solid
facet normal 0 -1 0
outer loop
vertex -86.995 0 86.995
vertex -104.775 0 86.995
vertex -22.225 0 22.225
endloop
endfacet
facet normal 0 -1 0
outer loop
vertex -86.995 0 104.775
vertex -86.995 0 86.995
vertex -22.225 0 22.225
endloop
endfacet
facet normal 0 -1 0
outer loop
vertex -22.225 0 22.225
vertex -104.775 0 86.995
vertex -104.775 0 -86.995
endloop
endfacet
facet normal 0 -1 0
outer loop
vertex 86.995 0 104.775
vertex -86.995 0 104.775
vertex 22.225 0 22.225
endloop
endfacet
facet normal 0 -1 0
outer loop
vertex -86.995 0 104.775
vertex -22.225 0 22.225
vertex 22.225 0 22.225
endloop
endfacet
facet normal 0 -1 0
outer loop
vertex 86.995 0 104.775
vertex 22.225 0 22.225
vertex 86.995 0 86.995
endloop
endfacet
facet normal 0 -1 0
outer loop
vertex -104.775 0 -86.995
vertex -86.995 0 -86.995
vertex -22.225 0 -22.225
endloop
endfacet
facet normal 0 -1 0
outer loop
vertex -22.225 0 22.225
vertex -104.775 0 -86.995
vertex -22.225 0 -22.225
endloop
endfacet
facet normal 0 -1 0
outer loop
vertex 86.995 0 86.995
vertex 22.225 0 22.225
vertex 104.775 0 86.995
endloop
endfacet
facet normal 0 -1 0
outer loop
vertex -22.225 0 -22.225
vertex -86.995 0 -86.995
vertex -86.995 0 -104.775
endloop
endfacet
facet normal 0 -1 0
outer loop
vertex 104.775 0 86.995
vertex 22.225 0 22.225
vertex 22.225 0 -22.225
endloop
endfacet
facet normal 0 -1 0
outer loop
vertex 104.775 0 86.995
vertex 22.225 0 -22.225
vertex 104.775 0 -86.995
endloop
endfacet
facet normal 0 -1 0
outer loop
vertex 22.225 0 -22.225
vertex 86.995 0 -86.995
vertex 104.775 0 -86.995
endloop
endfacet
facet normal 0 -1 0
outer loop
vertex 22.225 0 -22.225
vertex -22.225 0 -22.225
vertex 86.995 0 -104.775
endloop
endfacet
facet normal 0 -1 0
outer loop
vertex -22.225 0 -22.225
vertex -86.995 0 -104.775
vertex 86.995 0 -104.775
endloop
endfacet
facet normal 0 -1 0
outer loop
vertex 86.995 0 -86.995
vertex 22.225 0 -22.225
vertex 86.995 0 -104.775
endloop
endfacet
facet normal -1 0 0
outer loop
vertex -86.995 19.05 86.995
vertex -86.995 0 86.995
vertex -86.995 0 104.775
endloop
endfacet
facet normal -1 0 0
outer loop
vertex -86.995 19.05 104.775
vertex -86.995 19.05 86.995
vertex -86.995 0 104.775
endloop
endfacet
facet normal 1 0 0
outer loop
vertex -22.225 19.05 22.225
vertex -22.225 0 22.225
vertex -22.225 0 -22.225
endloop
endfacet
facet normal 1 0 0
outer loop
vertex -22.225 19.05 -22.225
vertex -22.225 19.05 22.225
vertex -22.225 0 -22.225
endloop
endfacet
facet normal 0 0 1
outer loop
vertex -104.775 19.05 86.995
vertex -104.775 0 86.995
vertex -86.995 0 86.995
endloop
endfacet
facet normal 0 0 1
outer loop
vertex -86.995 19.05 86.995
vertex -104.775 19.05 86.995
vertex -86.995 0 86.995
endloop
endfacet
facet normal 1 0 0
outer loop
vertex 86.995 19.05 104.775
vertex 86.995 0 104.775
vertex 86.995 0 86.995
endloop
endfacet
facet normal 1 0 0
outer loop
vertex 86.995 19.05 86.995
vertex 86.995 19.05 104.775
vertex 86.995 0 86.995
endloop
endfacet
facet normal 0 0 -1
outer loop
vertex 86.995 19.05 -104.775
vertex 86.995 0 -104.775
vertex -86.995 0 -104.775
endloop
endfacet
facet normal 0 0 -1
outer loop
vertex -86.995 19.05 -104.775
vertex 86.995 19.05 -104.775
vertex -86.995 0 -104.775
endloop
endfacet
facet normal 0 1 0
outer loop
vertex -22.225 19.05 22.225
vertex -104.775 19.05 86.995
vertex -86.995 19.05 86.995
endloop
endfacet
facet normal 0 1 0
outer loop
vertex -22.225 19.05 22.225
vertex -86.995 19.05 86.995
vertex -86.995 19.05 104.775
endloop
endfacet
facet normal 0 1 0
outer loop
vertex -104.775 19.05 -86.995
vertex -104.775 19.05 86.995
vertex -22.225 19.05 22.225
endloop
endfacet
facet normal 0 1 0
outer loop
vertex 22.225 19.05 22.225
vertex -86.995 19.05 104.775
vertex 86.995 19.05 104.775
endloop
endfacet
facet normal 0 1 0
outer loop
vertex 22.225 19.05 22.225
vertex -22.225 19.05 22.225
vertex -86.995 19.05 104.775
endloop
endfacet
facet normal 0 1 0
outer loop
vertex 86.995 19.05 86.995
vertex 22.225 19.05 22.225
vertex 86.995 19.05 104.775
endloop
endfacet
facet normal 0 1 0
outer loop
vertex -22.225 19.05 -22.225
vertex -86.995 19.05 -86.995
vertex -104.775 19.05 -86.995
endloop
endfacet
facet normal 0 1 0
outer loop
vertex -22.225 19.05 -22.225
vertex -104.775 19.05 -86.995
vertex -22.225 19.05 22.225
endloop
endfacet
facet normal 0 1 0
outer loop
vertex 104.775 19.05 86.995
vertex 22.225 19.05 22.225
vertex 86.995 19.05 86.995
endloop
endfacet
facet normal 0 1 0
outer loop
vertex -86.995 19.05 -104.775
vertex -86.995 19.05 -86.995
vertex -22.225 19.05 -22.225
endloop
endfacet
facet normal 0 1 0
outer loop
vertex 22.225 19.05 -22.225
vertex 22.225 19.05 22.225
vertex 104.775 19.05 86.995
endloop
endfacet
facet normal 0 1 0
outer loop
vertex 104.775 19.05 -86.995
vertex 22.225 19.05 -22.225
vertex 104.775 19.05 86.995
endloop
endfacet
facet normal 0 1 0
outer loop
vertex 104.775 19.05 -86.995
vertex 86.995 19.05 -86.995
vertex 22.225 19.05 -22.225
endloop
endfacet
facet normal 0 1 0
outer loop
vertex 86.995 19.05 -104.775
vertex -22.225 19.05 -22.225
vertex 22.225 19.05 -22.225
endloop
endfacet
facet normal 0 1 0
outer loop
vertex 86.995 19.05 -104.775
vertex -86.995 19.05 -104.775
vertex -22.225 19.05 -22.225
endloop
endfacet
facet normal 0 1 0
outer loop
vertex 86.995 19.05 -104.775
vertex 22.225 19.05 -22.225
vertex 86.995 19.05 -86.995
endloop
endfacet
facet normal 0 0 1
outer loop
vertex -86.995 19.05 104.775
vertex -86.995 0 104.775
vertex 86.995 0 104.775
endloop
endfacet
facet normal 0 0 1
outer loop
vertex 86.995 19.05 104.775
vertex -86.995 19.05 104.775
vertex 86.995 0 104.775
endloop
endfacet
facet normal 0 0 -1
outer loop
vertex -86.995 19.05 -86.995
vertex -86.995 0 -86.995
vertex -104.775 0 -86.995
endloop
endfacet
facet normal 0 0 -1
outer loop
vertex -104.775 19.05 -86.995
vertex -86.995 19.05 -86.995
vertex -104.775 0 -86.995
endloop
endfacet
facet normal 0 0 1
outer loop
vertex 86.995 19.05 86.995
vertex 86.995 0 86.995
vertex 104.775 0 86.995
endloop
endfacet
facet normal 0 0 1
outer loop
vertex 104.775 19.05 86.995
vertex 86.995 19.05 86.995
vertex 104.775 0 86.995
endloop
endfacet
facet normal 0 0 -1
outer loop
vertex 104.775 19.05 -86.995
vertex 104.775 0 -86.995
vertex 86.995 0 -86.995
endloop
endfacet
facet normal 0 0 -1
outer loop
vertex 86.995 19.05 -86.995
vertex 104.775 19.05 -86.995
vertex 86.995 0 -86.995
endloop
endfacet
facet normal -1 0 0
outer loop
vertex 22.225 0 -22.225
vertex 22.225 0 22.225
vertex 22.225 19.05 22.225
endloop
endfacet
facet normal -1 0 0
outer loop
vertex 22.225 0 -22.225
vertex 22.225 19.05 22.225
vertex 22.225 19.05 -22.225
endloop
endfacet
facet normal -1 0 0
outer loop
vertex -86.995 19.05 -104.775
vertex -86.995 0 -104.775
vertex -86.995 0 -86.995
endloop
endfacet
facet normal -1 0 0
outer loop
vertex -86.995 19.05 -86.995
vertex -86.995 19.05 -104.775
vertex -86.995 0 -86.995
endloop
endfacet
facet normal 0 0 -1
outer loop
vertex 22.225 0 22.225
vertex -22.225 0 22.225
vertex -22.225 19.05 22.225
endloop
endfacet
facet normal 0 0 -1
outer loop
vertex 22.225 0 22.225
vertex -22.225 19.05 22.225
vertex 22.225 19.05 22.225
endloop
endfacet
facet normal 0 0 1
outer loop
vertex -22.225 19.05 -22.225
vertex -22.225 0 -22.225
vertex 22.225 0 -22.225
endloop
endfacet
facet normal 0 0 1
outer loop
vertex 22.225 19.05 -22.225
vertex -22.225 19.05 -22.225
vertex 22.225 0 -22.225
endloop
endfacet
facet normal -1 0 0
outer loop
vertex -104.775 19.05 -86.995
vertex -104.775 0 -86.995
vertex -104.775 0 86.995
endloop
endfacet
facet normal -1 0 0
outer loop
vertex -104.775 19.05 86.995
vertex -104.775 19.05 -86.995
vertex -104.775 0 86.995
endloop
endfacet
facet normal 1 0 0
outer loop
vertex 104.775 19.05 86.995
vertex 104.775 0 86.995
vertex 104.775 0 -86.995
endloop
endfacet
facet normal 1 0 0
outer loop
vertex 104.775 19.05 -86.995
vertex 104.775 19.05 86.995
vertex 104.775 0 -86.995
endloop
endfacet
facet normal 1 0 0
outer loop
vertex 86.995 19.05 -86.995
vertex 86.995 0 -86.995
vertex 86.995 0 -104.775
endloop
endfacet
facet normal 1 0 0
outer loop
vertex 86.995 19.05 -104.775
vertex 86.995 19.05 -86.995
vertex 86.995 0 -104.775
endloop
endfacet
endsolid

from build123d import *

# Parameters (mm, degrees)
SKETCH1_W           = 44.45
SKETCH1_H           = 44.45
BOSS_EXTRUDE1_DEPTH = 19.05


with BuildPart() as part:
    # Sketch1 → Boss-Extrude1 (new body)
    with BuildSketch(Plane(origin=(0, 0, 0), x_dir=(1, 0, 0), z_dir=(0, 1, 0))):
        Polygon((-86.995, 86.995), (-104.775, 86.995), (-104.775, -86.995), (-86.995, -86.995), (-86.995, -104.775), (86.995, -104.775), (86.995, -86.995), (104.775, -86.995), (104.775, 86.995), (86.995, 86.995), (86.995, 104.775), (-86.995, 104.775), align=None)
        Rectangle(SKETCH1_W, SKETCH1_H, mode=Mode.SUBTRACT)
    extrude(amount=BOSS_EXTRUDE1_DEPTH)


solid = part.part
